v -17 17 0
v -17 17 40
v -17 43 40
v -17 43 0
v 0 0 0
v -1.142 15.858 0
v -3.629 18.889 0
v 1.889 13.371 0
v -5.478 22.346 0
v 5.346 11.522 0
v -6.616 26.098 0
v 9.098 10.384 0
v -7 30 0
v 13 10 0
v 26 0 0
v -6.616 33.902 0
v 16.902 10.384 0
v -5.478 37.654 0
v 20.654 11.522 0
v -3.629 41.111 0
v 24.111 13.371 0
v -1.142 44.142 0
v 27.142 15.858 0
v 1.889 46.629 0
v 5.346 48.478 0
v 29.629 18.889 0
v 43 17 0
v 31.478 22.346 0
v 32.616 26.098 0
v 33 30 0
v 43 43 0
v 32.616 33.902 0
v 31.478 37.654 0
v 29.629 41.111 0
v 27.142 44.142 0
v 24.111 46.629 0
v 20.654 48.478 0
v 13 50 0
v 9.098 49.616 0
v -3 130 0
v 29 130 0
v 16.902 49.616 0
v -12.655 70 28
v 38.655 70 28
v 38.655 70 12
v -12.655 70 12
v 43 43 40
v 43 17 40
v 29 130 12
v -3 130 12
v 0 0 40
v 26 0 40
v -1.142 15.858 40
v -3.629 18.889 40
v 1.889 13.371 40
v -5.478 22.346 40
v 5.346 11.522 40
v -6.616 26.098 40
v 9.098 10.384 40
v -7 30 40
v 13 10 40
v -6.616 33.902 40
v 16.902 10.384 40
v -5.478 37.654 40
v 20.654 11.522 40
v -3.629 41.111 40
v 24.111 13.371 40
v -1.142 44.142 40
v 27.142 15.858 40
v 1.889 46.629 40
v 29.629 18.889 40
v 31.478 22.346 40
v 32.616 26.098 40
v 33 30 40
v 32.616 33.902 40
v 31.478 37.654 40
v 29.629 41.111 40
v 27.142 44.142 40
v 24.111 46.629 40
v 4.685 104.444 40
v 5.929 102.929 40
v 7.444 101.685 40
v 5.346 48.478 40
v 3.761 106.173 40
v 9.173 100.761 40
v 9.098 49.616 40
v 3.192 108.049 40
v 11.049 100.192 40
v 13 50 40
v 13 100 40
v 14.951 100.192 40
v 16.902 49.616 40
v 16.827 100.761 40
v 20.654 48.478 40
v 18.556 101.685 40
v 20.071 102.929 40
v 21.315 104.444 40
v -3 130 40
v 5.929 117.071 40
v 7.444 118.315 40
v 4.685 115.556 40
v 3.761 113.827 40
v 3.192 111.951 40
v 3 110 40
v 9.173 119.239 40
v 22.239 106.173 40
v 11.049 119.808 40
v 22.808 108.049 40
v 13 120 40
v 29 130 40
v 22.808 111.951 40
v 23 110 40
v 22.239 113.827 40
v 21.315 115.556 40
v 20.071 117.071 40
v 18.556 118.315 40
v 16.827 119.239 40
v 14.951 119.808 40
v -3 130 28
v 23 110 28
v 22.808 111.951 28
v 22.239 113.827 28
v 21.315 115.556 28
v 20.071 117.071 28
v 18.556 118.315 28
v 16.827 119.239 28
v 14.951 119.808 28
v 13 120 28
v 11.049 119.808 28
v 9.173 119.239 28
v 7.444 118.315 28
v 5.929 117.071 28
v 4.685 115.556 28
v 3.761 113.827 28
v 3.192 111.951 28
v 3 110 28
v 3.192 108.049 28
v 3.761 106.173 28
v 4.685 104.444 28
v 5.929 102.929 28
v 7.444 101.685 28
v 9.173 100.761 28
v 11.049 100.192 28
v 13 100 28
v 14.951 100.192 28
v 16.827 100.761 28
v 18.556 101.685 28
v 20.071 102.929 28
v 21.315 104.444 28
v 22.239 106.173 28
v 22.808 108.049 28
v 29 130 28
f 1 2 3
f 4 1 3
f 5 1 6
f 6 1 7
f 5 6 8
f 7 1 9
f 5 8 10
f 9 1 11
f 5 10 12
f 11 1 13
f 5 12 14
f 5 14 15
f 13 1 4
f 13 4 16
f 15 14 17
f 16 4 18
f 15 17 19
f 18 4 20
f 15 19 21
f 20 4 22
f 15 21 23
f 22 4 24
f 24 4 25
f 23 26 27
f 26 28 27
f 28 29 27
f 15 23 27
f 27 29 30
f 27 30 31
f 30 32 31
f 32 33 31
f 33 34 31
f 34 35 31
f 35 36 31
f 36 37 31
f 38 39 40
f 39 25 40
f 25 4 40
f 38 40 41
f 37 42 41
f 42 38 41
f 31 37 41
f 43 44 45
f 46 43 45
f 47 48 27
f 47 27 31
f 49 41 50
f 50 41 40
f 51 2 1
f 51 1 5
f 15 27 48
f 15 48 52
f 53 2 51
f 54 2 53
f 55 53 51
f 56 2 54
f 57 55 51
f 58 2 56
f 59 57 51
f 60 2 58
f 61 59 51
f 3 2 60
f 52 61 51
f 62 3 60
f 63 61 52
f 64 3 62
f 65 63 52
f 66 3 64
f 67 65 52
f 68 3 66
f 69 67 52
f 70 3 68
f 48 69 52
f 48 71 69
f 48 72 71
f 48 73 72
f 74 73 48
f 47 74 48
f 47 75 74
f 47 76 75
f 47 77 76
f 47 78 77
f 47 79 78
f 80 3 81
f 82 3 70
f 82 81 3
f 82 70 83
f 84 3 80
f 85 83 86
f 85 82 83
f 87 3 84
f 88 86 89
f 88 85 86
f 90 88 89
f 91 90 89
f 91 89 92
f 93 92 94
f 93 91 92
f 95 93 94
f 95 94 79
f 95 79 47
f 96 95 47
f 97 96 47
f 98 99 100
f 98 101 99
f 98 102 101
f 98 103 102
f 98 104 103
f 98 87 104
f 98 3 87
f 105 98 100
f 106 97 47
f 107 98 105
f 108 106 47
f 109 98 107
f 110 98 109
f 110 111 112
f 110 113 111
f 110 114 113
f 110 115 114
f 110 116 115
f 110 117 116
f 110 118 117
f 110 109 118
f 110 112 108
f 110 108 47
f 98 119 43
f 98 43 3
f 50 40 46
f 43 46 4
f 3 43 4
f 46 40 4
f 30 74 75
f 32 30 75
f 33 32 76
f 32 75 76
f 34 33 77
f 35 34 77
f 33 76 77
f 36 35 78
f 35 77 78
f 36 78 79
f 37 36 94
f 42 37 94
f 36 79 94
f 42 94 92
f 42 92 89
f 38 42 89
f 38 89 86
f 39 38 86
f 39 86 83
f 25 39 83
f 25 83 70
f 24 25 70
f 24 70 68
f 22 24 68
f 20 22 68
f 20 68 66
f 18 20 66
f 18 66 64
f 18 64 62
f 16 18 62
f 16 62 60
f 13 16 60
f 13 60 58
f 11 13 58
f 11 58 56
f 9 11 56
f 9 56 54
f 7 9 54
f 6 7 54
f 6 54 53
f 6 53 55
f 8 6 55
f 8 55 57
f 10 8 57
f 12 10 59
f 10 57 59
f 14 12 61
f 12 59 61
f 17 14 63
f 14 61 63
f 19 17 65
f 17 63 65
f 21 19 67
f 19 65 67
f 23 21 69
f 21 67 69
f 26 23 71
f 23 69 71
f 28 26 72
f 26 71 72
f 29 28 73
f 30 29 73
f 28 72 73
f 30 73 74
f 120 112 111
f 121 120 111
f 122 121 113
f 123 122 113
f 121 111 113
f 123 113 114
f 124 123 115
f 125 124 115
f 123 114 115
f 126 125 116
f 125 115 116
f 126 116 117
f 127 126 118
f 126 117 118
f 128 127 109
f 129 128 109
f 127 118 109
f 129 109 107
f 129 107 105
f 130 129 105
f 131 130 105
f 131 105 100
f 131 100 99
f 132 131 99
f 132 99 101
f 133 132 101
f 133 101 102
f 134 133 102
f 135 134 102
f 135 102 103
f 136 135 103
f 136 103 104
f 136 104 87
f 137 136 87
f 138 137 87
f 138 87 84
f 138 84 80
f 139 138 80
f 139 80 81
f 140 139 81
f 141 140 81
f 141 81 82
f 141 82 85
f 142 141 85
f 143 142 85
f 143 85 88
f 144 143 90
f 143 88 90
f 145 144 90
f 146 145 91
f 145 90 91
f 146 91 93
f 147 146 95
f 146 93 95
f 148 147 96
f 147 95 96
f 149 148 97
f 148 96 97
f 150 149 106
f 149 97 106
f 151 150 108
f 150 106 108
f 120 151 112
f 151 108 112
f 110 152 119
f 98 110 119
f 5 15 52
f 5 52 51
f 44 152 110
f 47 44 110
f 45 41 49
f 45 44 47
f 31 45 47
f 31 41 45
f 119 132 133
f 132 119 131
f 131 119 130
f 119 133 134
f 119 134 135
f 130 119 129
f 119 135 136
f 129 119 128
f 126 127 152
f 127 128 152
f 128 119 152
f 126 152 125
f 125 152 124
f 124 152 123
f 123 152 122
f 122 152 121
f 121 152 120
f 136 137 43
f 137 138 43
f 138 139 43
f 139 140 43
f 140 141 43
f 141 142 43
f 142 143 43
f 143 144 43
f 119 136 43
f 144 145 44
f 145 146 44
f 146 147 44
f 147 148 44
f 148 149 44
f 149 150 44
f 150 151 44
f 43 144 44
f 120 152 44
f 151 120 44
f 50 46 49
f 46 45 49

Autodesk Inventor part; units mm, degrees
ref_plane "YZ Plane" through (0, 0, 0) normal (1, 0, 0) x (0, 1, 0)
ref_plane "XZ Plane" through (0, 0, 0) normal (0, 1, 0) x (-1, 0, 0)
ref_plane "XY Plane" through (0, 0, 0) normal (0, 0, 1) x (1, 0, 0)
sketch "Náčrt1" plane through (0, 0, 0) normal (0, 0, 1) x (1, 0, 0)
  line L0 (43, 17) -> (26, 0)
  line L1 (43, 17) -> (43, 43)
  line L2 (29, 130) -> (43, 43)
  line L3 (26, 0) -> (13, 0)
  line L4 (29, 130) -> (13, 130)
  line L5 (13, 134.5754) -> (13, -3.2687)
  line L6 (-17, 17) -> (0, 0)
  line L7 (-17, 17) -> (-17, 43)
  line L8 (-3, 130) -> (-17, 43)
  line L9 (0, 0) -> (13, 0)
  line L10 (-3, 130) -> (13, 130)
  dimension "d3" = 26
  dimension "d6" = 13
  dimension "d7" = 16
extrude "Vysunutí1" add sketch "Náčrt1" along normal blind 40
sketch "Náčrt2" plane through (43, 17, 0) normal (1, 0, 0) x (0, 0, -1)
  line L0 (0, 113) -> (-40, 113) projected
  line L1 (-28, 113) -> (-28, 53)
  line L2 (-28, 53) -> (-12, 53)
  line L3 (-12, 53) -> (-12, 113)
  line L4 (-28, 113) -> (-12, 113)
  point P0 (0, -17)
  dimension "d10" = 60
  dimension "d11" = 16
extrude "Vysunutí2" cut sketch "Náčrt2" against normal through all
sketch "Náčrt3" plane through (0, 0, 40) normal (0, 0, 1) x (1, 0, 0)
  circle A0 centre (13, 30) radius 20
  circle A1 centre (13, 110) radius 10
  point P0 (0, 0)
  dimension "d14" = 40
  dimension "d15" = 20
extrude "Vysunutí3" cut sketch "Náčrt3" against normal through all contours A0
sketch "Náčrt4" plane through (0, 0, 40) normal (0, 0, 1) x (1, 0, 0)
  circle A0 centre (13, 110) radius 10
  point P0 (0, 0)
  dimension "d18" = 20
extrude "Vysunutí4" cut sketch "Náčrt4" against normal blind 20
properties part number "11"
